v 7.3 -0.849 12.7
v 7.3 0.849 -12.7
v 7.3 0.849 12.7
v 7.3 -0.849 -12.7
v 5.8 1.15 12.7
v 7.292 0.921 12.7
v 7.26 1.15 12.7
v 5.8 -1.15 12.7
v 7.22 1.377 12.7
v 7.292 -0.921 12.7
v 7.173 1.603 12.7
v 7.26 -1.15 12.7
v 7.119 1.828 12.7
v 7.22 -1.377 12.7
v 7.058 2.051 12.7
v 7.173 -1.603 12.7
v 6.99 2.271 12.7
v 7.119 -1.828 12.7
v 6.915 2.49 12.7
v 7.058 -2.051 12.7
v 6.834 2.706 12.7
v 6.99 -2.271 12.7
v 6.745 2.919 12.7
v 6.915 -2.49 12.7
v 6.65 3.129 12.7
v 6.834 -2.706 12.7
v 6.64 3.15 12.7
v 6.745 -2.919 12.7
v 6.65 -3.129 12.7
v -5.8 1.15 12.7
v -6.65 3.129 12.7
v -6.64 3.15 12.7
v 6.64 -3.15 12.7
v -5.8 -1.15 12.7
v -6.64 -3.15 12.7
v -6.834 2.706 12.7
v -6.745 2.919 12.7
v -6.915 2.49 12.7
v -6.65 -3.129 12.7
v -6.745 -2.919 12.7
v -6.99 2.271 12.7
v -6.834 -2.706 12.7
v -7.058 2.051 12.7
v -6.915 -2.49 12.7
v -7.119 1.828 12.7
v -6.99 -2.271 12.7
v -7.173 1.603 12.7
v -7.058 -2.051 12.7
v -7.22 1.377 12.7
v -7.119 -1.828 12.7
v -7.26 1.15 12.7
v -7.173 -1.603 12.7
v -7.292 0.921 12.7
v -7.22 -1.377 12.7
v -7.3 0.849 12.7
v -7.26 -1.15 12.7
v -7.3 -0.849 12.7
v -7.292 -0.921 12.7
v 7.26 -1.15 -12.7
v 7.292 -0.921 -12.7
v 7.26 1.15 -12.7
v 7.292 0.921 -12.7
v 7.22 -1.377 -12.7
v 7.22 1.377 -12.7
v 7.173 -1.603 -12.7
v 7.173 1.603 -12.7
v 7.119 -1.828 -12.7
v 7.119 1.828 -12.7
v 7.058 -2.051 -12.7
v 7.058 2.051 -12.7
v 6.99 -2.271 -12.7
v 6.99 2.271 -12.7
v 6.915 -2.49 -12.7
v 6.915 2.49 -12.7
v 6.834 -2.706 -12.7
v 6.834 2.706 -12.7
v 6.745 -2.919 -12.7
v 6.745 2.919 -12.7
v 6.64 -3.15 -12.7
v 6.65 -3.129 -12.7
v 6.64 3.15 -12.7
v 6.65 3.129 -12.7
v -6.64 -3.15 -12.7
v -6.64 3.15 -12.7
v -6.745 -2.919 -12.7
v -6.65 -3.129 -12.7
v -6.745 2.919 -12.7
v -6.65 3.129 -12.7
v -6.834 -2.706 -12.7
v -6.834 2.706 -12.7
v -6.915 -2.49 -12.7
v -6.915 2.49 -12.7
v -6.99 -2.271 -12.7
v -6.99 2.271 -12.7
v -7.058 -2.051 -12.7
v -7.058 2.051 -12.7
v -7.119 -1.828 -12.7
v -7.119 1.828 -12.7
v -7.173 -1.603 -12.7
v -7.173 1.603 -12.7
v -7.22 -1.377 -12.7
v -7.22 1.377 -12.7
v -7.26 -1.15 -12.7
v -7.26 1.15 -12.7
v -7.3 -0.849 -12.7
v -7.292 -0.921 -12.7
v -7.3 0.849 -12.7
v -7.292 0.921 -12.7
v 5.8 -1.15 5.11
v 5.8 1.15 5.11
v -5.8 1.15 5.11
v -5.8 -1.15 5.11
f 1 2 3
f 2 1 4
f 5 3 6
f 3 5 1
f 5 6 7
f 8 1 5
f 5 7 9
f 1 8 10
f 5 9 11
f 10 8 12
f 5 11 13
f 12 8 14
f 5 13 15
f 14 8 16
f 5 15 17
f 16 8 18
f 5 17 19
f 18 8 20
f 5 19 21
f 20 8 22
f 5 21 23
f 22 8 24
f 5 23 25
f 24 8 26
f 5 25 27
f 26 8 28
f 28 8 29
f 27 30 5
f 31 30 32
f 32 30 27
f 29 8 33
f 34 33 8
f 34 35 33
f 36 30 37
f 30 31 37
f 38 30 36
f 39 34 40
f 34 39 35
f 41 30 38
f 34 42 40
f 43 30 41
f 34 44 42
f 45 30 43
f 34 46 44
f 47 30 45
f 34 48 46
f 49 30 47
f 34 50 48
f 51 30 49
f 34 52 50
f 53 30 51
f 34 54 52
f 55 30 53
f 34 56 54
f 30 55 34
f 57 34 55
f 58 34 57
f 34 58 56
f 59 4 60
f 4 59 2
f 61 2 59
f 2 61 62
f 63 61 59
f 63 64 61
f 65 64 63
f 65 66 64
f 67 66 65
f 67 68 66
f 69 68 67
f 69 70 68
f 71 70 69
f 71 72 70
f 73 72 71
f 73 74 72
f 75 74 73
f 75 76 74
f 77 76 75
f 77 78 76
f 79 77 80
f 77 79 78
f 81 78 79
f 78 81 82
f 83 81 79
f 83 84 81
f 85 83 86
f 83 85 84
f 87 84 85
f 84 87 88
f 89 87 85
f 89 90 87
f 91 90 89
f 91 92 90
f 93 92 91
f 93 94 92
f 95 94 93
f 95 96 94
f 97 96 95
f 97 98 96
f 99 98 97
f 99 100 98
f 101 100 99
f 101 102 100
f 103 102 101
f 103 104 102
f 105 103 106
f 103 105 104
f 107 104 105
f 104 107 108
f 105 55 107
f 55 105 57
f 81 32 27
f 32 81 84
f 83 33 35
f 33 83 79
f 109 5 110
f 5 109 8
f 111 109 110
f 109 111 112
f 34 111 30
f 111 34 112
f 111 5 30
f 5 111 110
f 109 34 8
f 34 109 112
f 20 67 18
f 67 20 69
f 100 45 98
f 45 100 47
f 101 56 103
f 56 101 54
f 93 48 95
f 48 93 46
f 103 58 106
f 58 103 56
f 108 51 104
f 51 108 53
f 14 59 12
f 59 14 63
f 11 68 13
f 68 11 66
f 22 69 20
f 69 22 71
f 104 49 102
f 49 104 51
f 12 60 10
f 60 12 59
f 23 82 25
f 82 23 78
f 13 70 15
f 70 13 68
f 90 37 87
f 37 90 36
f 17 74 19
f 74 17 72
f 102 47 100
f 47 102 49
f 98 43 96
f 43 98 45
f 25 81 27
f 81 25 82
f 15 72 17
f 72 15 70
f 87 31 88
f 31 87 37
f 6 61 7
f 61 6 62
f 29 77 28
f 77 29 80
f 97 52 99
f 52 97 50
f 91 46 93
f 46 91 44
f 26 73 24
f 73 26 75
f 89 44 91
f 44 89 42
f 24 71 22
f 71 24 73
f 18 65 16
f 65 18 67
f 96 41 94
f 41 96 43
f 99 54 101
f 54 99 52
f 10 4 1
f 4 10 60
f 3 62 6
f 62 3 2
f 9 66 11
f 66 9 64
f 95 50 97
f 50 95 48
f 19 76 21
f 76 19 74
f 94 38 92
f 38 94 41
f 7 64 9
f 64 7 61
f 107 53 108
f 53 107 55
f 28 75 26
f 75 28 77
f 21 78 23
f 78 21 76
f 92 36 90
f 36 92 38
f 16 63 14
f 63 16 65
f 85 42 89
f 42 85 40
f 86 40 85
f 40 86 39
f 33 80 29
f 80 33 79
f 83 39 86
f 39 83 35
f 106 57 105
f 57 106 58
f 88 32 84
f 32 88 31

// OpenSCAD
$fn = 200*1;

//The total height of this magazine release extension
TOTAL_HEIGHT = 25.4;

//The depth of the pocket that the existing magazine release fits in
POCKET_DEPTH = 7.6;

//The width of the existing magazine release
RELEASE_WIDTH = 11.6;

//The height of the existing magazine release
RELEASE_HEIGHT = 2.3;

//How thick to make the walls (added to the RELEASE_WIDTH)
SIDE_WALL_THICKNESS = 1.5;

//How thick to make the walls (added to the RELEASE_HEIGHT)
TOP_AND_BOTTOM_WALL_THICKNESS = 2;

// Used to make sure that there isn't a "film" 
// of plastic covering the top
TOLERANCE = 0.01 * 1;

// An adjustment to the rounding of corners
ROUNDING_ADJUSTMENT = 0.05 * 1; //


intersection() {
	difference() {
		cube(size = [RELEASE_WIDTH + 2*SIDE_WALL_THICKNESS,
						 RELEASE_HEIGHT + 2*TOP_AND_BOTTOM_WALL_THICKNESS,
						 TOTAL_HEIGHT],
								 center = true);
		translate([0, 0, (TOTAL_HEIGHT - POCKET_DEPTH)/2 + TOLERANCE]){
			cube(size = [RELEASE_WIDTH, RELEASE_HEIGHT, POCKET_DEPTH], center = true);
		}
	}

	//Round the corners slightly
	cylinder(r = max( RELEASE_WIDTH/2 + SIDE_WALL_THICKNESS, RELEASE_HEIGHT/2 + TOP_AND_BOTTOM_WALL_THICKNESS) + ROUNDING_ADJUSTMENT, h = TOTAL_HEIGHT, center = true);

}
